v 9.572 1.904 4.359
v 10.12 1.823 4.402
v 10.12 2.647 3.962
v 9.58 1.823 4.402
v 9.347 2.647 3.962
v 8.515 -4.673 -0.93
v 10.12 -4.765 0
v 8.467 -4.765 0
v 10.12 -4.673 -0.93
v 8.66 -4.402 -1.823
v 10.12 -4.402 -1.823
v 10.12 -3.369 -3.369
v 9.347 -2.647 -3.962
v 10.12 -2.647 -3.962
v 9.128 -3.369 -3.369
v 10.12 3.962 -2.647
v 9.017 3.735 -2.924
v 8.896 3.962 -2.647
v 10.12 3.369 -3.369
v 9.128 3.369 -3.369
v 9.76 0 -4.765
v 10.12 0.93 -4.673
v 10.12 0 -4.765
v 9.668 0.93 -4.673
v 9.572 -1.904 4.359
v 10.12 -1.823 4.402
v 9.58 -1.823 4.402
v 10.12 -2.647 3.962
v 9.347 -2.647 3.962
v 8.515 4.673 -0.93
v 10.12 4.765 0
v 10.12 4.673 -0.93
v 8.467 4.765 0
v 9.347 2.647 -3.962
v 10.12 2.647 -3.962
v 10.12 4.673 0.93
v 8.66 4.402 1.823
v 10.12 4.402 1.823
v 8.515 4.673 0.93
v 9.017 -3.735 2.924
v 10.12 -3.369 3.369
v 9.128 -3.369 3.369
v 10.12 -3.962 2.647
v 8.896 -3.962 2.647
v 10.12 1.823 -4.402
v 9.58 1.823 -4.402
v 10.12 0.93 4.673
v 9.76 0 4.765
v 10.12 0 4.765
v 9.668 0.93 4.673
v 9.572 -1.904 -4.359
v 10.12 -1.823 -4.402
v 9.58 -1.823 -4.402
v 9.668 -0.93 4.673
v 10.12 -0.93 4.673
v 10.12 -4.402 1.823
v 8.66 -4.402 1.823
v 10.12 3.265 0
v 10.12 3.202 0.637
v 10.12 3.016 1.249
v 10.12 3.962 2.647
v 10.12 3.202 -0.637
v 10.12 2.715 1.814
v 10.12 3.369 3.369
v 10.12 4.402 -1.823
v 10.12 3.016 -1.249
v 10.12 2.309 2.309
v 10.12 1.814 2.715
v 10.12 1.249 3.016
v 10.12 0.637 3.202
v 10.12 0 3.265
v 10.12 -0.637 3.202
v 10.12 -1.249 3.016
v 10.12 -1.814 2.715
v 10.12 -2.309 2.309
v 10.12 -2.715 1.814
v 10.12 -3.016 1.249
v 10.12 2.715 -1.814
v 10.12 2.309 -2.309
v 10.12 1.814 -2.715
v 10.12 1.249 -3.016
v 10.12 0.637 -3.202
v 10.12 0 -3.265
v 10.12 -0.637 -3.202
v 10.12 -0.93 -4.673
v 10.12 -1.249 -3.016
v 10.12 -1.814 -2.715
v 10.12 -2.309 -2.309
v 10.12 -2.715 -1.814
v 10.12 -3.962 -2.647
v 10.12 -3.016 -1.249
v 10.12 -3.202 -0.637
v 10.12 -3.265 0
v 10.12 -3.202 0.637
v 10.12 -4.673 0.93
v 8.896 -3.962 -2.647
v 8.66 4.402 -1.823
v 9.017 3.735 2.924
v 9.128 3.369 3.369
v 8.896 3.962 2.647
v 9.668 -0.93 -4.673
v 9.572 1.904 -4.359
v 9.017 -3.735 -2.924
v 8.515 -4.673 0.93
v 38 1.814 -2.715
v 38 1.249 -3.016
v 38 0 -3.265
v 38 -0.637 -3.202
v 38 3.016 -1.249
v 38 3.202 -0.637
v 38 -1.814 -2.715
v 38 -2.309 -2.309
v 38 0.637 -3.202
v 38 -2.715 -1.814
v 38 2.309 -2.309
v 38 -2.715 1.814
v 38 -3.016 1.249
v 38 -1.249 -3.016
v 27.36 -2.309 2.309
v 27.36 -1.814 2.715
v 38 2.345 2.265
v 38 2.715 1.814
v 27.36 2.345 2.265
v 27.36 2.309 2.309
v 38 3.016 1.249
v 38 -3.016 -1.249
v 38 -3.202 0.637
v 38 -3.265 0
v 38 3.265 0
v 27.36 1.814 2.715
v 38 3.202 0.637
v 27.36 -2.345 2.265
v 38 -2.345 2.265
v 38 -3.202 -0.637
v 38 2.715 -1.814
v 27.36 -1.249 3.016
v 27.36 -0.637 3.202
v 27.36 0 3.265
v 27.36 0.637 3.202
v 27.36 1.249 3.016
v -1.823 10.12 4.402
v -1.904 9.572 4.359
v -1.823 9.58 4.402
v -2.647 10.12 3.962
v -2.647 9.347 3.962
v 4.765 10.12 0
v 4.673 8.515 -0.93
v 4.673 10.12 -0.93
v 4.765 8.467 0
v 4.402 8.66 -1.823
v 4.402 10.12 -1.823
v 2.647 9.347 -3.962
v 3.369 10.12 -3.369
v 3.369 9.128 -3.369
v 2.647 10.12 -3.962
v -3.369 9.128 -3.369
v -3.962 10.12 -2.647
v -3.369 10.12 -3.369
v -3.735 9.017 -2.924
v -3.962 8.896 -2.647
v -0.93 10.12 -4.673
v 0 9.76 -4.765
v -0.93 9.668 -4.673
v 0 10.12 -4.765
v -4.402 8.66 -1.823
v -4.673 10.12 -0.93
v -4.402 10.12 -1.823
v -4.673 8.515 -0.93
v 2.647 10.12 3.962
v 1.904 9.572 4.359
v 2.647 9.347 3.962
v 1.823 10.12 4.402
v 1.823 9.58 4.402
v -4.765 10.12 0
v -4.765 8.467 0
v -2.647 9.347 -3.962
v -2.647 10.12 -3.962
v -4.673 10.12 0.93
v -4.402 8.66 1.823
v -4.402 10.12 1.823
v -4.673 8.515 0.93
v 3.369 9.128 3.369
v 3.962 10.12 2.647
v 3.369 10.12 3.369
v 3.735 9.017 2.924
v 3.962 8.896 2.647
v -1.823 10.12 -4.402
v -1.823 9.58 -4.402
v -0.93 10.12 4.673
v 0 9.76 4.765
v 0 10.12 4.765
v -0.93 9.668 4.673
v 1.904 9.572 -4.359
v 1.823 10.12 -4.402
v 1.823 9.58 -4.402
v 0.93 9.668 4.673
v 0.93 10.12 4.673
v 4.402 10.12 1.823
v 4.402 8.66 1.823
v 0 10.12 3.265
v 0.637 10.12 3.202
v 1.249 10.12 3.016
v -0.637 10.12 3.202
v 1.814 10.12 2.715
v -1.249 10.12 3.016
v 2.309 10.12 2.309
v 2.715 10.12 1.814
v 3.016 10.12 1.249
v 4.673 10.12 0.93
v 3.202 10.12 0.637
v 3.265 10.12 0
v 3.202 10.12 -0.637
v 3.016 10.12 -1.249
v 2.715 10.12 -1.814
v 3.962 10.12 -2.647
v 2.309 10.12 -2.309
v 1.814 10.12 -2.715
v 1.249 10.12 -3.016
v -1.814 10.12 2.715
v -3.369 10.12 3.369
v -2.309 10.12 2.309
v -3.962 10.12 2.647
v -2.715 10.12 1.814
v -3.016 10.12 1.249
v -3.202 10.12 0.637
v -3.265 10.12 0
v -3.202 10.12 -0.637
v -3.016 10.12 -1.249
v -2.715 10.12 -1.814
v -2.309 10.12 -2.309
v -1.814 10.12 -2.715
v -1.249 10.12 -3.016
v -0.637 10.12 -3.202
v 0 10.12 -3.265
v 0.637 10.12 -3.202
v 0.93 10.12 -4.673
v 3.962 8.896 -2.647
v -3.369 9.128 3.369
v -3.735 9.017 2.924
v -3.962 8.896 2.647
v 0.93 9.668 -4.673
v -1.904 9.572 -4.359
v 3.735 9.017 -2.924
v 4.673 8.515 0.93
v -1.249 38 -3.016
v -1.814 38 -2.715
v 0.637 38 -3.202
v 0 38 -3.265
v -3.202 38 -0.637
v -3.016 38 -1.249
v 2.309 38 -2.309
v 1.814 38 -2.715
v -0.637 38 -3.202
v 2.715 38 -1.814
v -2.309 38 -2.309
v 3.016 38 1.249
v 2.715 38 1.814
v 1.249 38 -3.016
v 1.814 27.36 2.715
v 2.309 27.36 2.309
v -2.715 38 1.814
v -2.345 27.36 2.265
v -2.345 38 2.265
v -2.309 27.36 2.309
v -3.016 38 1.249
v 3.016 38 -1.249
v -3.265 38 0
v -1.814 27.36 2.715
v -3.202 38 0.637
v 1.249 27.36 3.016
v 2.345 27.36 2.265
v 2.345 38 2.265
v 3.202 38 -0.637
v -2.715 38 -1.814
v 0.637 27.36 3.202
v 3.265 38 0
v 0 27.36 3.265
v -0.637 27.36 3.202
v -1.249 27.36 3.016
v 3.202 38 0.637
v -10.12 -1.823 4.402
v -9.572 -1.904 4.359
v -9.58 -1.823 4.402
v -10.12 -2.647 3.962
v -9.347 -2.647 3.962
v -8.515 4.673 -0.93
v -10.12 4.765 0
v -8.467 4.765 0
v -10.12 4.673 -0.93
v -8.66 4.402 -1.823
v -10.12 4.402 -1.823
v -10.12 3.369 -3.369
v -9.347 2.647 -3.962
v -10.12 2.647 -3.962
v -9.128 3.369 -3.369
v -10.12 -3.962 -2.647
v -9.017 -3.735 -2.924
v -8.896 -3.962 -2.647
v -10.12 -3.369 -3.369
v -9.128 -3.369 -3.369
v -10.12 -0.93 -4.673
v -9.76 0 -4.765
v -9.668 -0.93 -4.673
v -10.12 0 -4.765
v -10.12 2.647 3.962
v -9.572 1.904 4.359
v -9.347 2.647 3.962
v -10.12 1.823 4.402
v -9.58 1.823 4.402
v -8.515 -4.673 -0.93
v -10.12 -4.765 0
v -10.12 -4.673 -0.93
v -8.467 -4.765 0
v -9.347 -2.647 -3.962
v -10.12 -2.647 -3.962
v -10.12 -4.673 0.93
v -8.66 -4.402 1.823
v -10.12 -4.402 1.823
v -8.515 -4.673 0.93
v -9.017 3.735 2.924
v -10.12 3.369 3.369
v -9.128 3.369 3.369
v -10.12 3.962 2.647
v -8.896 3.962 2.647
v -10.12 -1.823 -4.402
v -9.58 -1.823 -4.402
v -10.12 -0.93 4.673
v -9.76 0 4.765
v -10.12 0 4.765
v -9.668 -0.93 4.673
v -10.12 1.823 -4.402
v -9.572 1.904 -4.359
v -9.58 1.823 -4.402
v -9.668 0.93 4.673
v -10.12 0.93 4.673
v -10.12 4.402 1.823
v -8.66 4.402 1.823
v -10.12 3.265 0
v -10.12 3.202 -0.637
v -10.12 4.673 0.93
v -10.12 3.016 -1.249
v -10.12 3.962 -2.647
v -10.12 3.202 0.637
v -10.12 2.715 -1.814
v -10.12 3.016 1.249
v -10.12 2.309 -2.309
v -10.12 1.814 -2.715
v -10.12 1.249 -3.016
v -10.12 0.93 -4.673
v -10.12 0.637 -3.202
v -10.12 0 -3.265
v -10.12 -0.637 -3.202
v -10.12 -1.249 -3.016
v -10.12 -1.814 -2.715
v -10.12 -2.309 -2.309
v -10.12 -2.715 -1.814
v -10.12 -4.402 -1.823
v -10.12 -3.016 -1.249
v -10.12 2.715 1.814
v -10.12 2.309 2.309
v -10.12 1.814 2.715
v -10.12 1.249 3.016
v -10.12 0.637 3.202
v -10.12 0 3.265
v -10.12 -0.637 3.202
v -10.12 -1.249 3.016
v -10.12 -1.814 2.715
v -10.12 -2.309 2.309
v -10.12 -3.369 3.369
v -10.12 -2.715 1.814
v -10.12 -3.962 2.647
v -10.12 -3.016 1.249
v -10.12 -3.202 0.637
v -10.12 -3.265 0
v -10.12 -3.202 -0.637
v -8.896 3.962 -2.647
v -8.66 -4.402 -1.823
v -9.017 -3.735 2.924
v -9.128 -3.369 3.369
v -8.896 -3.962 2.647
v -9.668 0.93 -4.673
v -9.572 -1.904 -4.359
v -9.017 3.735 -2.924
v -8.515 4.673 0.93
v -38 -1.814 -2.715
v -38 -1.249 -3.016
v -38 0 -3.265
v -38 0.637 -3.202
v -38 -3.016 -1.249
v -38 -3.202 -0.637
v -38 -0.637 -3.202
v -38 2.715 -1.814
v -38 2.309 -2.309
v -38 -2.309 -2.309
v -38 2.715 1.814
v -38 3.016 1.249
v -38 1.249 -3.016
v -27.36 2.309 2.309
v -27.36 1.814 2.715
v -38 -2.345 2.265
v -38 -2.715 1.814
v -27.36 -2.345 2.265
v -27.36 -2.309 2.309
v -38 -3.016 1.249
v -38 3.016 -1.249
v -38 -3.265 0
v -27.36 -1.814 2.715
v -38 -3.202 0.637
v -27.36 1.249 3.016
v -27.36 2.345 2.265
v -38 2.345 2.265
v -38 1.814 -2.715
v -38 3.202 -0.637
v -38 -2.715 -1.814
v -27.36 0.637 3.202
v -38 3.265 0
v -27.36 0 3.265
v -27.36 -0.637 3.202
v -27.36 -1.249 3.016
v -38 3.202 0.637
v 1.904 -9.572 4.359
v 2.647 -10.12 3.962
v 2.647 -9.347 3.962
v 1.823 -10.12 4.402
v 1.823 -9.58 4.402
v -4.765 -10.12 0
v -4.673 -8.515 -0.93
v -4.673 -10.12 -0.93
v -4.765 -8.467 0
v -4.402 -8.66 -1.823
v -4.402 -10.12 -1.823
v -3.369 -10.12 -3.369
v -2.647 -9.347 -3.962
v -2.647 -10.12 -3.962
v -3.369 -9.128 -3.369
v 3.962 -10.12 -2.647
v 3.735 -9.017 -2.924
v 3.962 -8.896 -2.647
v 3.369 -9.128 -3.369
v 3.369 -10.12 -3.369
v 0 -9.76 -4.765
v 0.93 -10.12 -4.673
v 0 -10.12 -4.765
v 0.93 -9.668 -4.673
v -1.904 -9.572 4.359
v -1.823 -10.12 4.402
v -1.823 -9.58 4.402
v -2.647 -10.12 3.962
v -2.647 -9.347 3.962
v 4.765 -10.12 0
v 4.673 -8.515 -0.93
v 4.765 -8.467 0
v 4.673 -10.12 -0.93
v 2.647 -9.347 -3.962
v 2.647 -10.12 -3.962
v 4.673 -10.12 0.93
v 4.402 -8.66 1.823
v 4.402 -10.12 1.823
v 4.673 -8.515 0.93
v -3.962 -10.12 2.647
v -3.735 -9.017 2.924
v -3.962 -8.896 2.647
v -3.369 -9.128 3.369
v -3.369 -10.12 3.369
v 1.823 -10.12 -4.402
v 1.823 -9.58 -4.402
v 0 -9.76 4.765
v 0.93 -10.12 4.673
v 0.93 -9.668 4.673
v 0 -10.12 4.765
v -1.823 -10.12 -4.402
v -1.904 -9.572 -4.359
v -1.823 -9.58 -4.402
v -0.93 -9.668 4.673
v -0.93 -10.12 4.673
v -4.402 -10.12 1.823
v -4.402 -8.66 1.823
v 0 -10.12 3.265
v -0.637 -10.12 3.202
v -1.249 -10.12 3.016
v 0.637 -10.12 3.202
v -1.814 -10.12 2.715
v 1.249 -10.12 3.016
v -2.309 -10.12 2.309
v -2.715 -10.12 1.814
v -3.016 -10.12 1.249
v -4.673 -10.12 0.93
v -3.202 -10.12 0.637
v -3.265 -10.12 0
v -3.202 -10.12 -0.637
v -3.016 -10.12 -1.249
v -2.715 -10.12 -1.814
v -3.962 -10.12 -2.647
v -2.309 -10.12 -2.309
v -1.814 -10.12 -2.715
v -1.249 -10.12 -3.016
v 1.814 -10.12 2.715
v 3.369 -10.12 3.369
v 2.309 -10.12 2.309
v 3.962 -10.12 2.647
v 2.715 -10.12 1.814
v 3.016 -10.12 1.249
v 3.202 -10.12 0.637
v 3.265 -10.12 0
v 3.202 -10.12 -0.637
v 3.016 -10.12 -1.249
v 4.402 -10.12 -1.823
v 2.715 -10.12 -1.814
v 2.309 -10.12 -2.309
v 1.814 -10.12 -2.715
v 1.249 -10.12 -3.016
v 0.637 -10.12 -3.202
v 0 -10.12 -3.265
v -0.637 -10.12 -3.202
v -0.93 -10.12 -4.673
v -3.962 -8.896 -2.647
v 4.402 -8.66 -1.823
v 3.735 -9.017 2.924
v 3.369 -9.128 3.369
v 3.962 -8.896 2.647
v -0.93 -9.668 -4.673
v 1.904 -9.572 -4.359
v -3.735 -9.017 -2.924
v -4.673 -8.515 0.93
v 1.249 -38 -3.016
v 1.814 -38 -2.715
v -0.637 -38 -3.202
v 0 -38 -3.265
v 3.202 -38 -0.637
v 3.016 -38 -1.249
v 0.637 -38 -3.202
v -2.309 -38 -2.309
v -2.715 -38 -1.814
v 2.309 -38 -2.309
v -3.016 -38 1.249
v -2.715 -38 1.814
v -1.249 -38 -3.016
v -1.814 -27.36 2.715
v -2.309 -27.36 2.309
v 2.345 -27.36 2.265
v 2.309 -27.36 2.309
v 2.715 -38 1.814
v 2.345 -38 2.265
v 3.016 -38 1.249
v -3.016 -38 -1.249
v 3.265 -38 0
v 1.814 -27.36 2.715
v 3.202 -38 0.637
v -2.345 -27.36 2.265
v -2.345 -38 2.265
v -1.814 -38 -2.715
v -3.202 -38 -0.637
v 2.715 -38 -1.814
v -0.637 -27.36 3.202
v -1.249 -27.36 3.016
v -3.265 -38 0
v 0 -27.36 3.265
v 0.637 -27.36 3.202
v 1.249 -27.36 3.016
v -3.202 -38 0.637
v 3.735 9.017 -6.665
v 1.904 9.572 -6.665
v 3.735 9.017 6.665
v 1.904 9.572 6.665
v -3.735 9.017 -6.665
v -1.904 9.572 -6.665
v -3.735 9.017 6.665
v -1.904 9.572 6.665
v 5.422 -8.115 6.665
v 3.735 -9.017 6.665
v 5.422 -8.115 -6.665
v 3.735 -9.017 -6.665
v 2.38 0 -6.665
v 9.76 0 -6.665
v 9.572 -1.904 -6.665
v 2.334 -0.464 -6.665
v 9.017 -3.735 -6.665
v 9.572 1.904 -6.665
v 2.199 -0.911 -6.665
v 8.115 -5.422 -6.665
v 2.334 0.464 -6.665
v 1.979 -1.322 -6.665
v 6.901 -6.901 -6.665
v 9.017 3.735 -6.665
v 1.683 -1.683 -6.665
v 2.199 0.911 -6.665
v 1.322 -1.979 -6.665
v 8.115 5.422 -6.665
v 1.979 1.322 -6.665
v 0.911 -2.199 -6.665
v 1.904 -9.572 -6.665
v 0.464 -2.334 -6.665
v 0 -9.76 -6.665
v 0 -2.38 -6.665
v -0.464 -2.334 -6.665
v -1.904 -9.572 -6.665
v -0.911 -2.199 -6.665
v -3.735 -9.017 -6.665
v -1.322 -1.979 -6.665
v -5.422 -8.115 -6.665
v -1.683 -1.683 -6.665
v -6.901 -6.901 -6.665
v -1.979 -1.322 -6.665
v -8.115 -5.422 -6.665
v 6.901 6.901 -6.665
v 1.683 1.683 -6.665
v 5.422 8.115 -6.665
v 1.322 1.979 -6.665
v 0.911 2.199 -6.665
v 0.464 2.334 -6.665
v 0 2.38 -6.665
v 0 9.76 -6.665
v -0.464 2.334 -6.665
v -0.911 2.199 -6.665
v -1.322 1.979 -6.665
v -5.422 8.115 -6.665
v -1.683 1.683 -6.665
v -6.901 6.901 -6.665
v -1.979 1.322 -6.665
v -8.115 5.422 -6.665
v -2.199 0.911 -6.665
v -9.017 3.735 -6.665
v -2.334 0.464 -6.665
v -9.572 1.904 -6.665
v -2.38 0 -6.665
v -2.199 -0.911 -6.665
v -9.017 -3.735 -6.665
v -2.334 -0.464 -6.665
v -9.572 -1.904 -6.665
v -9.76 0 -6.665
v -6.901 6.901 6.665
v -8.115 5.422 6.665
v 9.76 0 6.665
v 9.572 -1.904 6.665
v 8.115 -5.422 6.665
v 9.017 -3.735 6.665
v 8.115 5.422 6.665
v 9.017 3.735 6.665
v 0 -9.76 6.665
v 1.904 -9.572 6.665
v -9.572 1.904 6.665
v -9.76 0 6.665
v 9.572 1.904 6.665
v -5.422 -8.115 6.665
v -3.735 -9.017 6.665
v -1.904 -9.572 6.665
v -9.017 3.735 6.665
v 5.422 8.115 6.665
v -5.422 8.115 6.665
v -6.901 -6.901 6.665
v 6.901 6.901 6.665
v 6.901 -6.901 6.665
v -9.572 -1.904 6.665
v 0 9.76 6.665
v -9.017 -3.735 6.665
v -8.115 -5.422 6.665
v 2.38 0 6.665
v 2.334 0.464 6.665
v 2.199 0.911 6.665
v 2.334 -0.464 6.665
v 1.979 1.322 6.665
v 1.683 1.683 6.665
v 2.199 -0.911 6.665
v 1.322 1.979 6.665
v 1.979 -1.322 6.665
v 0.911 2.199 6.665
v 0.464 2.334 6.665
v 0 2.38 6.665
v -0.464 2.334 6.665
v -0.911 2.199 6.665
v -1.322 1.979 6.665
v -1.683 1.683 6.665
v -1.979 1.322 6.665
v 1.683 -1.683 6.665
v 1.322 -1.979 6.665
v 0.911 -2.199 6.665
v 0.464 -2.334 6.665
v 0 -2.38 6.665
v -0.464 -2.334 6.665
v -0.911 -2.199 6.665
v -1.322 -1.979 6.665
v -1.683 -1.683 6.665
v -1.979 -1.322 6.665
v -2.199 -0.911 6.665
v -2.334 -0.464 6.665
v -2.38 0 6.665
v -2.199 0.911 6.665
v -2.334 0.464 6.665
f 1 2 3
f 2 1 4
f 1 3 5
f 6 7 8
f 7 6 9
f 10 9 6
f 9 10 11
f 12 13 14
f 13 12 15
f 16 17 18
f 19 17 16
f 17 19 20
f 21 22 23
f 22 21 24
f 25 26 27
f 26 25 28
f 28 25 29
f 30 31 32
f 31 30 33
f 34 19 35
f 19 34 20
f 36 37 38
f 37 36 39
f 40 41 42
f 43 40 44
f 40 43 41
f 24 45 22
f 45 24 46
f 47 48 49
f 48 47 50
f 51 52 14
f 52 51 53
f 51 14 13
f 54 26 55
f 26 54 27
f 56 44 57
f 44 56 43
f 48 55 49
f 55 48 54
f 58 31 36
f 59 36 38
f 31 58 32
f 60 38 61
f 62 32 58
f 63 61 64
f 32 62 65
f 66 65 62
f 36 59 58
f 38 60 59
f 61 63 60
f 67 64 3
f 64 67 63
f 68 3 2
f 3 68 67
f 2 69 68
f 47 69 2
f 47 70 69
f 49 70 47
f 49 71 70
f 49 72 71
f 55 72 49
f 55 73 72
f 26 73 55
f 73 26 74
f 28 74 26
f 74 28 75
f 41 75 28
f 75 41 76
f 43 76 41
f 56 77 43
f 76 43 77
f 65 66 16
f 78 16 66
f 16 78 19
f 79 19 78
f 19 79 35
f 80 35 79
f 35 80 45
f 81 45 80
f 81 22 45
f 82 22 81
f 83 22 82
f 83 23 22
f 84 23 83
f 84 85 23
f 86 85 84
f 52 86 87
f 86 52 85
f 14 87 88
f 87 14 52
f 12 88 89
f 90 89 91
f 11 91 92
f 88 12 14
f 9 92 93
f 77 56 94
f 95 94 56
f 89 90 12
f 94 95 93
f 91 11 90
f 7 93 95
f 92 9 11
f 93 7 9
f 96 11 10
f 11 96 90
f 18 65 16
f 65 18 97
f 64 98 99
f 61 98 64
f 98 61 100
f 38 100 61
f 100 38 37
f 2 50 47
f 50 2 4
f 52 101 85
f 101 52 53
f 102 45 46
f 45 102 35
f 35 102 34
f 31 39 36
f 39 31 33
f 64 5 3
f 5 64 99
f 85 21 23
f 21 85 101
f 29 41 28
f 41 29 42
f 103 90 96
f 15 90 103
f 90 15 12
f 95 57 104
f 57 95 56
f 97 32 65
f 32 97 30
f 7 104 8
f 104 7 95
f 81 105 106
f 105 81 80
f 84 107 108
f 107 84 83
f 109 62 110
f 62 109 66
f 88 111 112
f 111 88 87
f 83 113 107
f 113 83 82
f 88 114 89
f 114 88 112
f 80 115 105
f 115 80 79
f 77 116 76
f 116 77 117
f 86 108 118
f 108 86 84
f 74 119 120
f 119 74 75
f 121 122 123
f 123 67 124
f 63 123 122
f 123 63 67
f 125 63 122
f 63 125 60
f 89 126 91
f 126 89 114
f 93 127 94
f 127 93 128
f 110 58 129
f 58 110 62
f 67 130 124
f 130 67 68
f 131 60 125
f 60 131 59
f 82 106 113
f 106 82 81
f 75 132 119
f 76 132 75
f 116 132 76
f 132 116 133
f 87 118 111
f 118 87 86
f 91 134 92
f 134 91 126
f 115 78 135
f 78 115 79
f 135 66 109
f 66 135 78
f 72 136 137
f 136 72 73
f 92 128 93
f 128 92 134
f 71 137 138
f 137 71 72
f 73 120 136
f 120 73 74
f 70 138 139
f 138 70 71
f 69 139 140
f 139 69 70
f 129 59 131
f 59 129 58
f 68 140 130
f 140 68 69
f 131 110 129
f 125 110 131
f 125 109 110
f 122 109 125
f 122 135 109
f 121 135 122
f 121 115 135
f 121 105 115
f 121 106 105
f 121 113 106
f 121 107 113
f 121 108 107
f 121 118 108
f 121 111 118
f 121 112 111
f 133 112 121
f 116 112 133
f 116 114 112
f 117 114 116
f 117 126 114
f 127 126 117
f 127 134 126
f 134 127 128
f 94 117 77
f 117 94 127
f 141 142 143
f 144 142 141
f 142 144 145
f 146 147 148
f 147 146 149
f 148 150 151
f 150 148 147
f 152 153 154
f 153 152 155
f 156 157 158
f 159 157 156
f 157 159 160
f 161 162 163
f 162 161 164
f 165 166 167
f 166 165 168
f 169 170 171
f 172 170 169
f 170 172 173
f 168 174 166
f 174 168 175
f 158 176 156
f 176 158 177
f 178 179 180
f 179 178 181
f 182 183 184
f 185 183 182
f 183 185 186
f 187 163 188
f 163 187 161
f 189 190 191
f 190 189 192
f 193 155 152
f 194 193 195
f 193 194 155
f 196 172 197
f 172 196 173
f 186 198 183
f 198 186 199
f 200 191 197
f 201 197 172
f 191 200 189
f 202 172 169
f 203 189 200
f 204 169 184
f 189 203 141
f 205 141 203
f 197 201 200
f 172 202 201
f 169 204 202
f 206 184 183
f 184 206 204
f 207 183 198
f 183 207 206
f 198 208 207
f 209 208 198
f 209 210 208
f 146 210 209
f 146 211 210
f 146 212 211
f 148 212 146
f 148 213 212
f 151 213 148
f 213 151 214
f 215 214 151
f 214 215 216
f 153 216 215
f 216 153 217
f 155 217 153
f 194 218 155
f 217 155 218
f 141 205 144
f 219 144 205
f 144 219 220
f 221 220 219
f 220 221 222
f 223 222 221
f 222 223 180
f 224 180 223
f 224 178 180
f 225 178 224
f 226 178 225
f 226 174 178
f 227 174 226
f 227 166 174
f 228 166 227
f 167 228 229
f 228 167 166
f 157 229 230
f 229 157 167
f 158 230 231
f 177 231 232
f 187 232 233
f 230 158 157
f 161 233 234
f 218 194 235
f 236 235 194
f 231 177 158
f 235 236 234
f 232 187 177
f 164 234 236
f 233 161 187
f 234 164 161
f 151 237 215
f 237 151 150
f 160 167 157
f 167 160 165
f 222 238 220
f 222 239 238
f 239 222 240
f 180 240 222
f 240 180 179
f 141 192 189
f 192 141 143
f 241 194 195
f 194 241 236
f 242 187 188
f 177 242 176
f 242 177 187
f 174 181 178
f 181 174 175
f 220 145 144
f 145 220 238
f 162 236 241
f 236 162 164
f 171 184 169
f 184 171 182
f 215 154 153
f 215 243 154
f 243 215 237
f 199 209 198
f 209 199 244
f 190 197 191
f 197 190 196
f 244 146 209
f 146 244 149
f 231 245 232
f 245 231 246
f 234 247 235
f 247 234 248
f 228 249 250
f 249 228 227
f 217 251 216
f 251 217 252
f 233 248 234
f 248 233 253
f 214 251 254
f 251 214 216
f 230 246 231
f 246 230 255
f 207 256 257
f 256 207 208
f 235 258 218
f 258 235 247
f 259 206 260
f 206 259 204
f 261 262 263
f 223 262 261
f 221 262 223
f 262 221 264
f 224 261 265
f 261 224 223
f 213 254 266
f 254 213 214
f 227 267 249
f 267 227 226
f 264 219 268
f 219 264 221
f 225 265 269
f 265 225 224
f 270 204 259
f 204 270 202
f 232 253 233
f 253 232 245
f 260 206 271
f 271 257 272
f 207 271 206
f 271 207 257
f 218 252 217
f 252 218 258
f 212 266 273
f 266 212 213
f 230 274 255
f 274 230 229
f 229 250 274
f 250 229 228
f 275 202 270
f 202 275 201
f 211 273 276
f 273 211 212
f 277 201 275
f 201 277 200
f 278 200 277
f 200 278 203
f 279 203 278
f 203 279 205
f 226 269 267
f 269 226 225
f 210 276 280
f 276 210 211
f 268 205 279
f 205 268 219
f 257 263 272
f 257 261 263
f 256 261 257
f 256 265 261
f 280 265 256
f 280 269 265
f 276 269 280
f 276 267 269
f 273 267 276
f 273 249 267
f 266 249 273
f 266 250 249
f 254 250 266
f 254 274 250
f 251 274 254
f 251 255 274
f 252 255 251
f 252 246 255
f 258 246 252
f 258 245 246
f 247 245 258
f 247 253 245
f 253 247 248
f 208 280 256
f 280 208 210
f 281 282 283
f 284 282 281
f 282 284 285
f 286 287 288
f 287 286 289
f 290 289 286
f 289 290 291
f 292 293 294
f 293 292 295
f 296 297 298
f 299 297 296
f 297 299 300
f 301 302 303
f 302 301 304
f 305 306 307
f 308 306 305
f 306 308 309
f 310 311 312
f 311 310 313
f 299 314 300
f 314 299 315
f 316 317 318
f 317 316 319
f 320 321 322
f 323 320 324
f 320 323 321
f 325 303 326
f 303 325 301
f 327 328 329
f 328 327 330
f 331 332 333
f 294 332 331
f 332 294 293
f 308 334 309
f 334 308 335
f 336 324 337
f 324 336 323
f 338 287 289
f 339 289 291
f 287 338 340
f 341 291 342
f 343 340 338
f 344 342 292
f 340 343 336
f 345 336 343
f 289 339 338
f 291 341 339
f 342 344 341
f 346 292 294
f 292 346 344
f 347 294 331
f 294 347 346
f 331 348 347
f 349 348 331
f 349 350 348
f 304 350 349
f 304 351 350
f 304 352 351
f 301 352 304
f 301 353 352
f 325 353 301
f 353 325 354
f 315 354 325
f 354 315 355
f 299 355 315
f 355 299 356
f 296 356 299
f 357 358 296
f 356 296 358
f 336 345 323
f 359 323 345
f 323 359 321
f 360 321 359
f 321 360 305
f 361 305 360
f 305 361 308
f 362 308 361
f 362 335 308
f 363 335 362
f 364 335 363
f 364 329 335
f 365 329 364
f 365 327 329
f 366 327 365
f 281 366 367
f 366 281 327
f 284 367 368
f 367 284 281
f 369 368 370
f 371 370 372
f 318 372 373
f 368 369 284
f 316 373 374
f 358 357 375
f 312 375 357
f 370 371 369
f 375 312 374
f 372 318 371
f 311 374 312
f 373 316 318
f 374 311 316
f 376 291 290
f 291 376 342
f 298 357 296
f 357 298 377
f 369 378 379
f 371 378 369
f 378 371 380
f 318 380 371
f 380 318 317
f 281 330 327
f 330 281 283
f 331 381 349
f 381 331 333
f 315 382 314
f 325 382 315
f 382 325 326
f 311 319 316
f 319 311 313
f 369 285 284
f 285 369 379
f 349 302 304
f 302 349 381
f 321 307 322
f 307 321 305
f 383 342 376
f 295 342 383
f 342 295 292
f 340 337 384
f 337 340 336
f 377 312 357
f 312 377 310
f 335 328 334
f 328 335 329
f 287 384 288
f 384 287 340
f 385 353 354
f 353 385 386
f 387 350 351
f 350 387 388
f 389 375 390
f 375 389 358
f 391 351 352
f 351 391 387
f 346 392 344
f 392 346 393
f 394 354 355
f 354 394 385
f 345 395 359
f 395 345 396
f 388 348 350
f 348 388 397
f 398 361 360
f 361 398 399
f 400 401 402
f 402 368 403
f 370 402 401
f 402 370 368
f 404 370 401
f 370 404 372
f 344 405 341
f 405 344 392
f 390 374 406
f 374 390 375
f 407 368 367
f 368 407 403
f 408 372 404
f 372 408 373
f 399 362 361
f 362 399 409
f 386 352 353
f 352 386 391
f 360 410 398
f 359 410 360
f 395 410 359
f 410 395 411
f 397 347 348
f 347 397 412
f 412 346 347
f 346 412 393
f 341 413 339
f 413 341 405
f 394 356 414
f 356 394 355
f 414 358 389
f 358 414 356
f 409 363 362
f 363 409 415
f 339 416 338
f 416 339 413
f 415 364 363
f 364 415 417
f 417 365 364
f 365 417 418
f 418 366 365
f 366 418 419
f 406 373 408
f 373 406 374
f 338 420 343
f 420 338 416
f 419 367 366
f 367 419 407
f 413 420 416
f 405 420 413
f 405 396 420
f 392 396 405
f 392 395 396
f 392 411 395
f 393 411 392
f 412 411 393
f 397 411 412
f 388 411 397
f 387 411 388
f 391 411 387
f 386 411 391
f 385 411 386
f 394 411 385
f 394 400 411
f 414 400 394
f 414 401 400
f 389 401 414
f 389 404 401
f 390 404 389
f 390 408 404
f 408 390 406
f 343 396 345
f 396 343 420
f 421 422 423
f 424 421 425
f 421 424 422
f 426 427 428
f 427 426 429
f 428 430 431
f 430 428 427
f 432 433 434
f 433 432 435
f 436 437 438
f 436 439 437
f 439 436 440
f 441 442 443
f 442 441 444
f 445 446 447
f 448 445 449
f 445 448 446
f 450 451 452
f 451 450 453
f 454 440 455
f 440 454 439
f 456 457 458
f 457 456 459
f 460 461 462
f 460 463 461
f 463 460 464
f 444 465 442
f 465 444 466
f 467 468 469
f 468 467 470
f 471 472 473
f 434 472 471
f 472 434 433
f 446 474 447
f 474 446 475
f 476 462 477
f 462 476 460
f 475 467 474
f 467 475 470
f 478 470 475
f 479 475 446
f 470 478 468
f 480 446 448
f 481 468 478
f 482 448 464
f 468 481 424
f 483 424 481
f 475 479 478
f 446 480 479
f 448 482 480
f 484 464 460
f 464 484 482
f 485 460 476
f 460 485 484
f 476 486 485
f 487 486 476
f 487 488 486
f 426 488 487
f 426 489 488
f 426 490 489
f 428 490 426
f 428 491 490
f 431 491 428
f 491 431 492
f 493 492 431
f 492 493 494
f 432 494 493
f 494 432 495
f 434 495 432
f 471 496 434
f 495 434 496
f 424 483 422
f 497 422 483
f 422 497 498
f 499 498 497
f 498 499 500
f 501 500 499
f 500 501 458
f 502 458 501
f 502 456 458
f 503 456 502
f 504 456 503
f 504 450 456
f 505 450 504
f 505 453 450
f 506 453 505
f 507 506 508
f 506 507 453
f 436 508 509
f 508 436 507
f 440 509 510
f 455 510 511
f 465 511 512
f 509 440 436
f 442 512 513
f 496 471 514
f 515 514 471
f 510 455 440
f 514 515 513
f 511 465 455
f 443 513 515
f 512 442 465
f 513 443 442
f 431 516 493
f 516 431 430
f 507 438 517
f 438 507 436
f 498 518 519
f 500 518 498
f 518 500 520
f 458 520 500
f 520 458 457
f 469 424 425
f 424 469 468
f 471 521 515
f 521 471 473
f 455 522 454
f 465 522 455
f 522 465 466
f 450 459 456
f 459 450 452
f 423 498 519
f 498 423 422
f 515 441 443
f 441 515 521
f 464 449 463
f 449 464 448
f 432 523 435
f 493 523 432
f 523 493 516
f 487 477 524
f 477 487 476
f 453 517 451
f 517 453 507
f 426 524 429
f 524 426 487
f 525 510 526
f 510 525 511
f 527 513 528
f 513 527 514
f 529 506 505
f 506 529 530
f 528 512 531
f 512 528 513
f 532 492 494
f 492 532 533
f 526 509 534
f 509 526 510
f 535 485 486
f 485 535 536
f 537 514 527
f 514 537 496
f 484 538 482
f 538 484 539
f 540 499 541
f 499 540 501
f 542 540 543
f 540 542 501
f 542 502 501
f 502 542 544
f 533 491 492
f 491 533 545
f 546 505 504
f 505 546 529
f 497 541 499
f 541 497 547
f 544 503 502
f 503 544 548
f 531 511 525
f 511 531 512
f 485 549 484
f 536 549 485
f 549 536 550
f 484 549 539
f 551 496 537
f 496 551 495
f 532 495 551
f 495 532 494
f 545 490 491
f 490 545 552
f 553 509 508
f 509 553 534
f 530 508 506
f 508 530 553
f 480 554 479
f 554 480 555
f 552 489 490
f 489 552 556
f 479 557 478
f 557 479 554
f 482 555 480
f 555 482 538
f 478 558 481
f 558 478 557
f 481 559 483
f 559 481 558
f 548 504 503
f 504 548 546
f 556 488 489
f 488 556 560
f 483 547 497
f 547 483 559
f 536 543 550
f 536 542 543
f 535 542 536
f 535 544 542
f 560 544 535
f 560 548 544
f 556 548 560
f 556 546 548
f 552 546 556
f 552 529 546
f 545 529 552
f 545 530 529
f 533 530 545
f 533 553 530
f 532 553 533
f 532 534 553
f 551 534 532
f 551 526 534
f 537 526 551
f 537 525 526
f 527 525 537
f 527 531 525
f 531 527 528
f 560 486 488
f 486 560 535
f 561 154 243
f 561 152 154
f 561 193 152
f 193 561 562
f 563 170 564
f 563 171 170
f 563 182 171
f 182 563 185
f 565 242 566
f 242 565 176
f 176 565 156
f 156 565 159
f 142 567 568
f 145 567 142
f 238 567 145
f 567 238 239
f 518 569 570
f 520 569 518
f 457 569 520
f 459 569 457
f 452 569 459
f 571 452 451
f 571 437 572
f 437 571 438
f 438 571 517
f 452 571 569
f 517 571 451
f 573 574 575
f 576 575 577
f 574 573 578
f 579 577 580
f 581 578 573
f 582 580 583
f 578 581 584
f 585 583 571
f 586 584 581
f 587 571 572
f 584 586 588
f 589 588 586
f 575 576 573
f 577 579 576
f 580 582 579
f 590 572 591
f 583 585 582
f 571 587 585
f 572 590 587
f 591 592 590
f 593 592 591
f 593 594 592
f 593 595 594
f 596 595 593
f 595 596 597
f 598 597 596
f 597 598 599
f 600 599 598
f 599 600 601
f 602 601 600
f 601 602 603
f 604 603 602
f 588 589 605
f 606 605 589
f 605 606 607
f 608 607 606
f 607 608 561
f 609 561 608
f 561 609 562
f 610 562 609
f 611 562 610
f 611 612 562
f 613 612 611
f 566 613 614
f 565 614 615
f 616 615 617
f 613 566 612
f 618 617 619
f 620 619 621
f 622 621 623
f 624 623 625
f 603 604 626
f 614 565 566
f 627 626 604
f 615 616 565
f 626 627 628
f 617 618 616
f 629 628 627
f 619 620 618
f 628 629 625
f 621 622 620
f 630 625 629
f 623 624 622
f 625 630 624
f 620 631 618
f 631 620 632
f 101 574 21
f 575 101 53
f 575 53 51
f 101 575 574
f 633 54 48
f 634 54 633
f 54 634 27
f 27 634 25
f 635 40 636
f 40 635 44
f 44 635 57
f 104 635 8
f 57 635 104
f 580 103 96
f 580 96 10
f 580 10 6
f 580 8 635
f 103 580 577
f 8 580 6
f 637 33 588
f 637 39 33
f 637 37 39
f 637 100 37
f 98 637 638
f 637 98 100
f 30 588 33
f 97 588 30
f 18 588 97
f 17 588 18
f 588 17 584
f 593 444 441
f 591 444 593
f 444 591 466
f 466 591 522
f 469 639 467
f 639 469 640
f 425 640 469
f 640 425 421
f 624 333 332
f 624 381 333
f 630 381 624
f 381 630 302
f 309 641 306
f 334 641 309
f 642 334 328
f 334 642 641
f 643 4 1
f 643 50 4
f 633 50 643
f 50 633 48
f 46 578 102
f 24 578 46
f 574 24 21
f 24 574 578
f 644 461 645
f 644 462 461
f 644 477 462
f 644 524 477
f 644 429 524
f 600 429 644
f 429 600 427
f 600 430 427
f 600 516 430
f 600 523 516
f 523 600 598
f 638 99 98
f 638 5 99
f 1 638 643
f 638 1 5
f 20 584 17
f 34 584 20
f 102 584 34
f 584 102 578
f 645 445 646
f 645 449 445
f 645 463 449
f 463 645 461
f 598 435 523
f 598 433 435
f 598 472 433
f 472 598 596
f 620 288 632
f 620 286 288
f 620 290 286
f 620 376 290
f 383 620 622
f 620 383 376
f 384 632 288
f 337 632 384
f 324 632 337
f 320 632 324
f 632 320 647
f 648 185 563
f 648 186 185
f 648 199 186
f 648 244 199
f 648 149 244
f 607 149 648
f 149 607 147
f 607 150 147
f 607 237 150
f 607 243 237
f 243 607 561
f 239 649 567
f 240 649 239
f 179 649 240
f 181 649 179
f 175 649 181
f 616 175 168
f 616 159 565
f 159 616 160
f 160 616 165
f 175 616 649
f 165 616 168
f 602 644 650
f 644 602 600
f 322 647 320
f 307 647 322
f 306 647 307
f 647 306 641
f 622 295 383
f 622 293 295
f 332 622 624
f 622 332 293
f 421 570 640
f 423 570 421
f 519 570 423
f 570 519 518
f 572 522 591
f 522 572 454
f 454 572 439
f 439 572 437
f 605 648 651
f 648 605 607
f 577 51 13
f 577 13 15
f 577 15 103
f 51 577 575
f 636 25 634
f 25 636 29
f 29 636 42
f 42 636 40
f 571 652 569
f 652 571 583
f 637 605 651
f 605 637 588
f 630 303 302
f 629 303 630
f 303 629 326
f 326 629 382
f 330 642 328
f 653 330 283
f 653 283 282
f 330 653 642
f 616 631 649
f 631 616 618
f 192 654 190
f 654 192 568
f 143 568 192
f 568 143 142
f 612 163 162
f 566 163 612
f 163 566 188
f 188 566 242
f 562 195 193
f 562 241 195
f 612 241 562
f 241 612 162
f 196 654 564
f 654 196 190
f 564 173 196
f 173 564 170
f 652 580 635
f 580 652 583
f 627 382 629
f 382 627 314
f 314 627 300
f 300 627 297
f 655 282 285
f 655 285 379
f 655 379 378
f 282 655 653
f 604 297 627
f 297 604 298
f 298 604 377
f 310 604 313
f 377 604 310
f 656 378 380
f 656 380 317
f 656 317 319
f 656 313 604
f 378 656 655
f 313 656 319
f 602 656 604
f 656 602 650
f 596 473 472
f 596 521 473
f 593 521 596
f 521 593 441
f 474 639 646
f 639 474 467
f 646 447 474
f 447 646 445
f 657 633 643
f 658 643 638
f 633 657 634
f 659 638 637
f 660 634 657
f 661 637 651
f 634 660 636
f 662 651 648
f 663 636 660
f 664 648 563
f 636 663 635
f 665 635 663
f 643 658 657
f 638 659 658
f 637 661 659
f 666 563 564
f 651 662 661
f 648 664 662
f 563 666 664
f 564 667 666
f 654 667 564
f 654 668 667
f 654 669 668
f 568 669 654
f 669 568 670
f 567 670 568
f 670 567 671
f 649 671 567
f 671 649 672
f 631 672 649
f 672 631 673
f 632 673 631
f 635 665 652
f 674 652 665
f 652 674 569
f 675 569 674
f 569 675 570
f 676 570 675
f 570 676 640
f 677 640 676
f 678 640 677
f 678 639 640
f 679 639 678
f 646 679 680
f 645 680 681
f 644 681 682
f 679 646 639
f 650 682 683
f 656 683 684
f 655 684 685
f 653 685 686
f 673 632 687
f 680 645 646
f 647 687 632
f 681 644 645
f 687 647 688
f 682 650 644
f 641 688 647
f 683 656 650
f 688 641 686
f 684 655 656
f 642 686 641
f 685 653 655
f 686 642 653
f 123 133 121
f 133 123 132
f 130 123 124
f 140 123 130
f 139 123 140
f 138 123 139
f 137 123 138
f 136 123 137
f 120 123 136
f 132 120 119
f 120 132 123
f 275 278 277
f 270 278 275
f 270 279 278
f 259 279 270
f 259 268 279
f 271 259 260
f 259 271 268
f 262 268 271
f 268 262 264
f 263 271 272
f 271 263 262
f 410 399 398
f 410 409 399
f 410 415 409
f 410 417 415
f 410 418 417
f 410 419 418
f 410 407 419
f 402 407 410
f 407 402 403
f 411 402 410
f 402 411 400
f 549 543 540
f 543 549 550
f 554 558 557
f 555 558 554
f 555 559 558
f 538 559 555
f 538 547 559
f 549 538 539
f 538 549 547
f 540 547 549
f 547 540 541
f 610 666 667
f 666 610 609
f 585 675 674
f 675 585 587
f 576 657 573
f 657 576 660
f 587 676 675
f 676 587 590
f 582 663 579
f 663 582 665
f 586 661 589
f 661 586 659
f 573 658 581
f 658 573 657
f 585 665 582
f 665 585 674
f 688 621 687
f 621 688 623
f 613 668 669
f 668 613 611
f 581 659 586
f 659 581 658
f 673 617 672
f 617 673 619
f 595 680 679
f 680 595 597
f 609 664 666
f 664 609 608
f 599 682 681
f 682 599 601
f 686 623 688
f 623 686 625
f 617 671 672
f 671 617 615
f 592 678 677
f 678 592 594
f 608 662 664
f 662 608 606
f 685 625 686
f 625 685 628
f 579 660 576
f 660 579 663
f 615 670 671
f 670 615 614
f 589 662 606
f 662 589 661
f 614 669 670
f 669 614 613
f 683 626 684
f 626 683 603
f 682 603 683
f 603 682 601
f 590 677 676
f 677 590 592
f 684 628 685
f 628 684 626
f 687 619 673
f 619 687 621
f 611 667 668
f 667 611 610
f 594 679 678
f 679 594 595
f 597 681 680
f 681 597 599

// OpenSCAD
$fn = 32;

// ----------------------------------------------------------------------
// Cardan cross: 76 mm span, 9.53 mm trunnions
// ----------------------------------------------------------------------

// --- parameters (mm) ---
journal_d = 9.53;         // trunnion diameter
arm_len = 38;             // trunnion length from the centre
step_r = 3.24;            // step position from the centre
step_d = 6.53;            // journal diameter after the step
hub_d = 19.52;            // hub diameter
hub_h = 13.33;            // hub height
bore_d = 4.76;            // hub bore
flat_d = 1;               // depth of the journal flat
flat_len = 10.64;         // length of the journal flat

difference() {
  union() {
    /* hub along the joint axis */
    cylinder(h = hub_h, d = hub_d, center = true);
    for (a = [0 : 90 : 270]) rotate([0, 0, a]) {
      /* trunnion, sunk into the hub */
      translate([hub_d / 4, 0, 0]) rotate([0, 90, 0]) cylinder(h = step_r + 2, d = journal_d);
      /* stepped journal out to the tip */
      translate([step_r - 0.5, 0, 0]) rotate([0, 90, 0]) cylinder(h = arm_len + 0.5 - step_r, d = step_d);
    }
  }
  /* lubrication bore through the hub, 2.5 mm clear on both sides */
  translate([0, 0, -hub_h / 2 - 2.5]) cylinder(h = hub_h + 5, d = bore_d);
  /* machined flat on each journal tip */
  for (a = [0 : 90 : 270]) rotate([0, 0, a]) {
    translate([arm_len - flat_len, -step_d, step_d / 2 - flat_d]) cube([flat_len + 0.5, 2 * step_d, flat_d + 2.5]);
  }
}
